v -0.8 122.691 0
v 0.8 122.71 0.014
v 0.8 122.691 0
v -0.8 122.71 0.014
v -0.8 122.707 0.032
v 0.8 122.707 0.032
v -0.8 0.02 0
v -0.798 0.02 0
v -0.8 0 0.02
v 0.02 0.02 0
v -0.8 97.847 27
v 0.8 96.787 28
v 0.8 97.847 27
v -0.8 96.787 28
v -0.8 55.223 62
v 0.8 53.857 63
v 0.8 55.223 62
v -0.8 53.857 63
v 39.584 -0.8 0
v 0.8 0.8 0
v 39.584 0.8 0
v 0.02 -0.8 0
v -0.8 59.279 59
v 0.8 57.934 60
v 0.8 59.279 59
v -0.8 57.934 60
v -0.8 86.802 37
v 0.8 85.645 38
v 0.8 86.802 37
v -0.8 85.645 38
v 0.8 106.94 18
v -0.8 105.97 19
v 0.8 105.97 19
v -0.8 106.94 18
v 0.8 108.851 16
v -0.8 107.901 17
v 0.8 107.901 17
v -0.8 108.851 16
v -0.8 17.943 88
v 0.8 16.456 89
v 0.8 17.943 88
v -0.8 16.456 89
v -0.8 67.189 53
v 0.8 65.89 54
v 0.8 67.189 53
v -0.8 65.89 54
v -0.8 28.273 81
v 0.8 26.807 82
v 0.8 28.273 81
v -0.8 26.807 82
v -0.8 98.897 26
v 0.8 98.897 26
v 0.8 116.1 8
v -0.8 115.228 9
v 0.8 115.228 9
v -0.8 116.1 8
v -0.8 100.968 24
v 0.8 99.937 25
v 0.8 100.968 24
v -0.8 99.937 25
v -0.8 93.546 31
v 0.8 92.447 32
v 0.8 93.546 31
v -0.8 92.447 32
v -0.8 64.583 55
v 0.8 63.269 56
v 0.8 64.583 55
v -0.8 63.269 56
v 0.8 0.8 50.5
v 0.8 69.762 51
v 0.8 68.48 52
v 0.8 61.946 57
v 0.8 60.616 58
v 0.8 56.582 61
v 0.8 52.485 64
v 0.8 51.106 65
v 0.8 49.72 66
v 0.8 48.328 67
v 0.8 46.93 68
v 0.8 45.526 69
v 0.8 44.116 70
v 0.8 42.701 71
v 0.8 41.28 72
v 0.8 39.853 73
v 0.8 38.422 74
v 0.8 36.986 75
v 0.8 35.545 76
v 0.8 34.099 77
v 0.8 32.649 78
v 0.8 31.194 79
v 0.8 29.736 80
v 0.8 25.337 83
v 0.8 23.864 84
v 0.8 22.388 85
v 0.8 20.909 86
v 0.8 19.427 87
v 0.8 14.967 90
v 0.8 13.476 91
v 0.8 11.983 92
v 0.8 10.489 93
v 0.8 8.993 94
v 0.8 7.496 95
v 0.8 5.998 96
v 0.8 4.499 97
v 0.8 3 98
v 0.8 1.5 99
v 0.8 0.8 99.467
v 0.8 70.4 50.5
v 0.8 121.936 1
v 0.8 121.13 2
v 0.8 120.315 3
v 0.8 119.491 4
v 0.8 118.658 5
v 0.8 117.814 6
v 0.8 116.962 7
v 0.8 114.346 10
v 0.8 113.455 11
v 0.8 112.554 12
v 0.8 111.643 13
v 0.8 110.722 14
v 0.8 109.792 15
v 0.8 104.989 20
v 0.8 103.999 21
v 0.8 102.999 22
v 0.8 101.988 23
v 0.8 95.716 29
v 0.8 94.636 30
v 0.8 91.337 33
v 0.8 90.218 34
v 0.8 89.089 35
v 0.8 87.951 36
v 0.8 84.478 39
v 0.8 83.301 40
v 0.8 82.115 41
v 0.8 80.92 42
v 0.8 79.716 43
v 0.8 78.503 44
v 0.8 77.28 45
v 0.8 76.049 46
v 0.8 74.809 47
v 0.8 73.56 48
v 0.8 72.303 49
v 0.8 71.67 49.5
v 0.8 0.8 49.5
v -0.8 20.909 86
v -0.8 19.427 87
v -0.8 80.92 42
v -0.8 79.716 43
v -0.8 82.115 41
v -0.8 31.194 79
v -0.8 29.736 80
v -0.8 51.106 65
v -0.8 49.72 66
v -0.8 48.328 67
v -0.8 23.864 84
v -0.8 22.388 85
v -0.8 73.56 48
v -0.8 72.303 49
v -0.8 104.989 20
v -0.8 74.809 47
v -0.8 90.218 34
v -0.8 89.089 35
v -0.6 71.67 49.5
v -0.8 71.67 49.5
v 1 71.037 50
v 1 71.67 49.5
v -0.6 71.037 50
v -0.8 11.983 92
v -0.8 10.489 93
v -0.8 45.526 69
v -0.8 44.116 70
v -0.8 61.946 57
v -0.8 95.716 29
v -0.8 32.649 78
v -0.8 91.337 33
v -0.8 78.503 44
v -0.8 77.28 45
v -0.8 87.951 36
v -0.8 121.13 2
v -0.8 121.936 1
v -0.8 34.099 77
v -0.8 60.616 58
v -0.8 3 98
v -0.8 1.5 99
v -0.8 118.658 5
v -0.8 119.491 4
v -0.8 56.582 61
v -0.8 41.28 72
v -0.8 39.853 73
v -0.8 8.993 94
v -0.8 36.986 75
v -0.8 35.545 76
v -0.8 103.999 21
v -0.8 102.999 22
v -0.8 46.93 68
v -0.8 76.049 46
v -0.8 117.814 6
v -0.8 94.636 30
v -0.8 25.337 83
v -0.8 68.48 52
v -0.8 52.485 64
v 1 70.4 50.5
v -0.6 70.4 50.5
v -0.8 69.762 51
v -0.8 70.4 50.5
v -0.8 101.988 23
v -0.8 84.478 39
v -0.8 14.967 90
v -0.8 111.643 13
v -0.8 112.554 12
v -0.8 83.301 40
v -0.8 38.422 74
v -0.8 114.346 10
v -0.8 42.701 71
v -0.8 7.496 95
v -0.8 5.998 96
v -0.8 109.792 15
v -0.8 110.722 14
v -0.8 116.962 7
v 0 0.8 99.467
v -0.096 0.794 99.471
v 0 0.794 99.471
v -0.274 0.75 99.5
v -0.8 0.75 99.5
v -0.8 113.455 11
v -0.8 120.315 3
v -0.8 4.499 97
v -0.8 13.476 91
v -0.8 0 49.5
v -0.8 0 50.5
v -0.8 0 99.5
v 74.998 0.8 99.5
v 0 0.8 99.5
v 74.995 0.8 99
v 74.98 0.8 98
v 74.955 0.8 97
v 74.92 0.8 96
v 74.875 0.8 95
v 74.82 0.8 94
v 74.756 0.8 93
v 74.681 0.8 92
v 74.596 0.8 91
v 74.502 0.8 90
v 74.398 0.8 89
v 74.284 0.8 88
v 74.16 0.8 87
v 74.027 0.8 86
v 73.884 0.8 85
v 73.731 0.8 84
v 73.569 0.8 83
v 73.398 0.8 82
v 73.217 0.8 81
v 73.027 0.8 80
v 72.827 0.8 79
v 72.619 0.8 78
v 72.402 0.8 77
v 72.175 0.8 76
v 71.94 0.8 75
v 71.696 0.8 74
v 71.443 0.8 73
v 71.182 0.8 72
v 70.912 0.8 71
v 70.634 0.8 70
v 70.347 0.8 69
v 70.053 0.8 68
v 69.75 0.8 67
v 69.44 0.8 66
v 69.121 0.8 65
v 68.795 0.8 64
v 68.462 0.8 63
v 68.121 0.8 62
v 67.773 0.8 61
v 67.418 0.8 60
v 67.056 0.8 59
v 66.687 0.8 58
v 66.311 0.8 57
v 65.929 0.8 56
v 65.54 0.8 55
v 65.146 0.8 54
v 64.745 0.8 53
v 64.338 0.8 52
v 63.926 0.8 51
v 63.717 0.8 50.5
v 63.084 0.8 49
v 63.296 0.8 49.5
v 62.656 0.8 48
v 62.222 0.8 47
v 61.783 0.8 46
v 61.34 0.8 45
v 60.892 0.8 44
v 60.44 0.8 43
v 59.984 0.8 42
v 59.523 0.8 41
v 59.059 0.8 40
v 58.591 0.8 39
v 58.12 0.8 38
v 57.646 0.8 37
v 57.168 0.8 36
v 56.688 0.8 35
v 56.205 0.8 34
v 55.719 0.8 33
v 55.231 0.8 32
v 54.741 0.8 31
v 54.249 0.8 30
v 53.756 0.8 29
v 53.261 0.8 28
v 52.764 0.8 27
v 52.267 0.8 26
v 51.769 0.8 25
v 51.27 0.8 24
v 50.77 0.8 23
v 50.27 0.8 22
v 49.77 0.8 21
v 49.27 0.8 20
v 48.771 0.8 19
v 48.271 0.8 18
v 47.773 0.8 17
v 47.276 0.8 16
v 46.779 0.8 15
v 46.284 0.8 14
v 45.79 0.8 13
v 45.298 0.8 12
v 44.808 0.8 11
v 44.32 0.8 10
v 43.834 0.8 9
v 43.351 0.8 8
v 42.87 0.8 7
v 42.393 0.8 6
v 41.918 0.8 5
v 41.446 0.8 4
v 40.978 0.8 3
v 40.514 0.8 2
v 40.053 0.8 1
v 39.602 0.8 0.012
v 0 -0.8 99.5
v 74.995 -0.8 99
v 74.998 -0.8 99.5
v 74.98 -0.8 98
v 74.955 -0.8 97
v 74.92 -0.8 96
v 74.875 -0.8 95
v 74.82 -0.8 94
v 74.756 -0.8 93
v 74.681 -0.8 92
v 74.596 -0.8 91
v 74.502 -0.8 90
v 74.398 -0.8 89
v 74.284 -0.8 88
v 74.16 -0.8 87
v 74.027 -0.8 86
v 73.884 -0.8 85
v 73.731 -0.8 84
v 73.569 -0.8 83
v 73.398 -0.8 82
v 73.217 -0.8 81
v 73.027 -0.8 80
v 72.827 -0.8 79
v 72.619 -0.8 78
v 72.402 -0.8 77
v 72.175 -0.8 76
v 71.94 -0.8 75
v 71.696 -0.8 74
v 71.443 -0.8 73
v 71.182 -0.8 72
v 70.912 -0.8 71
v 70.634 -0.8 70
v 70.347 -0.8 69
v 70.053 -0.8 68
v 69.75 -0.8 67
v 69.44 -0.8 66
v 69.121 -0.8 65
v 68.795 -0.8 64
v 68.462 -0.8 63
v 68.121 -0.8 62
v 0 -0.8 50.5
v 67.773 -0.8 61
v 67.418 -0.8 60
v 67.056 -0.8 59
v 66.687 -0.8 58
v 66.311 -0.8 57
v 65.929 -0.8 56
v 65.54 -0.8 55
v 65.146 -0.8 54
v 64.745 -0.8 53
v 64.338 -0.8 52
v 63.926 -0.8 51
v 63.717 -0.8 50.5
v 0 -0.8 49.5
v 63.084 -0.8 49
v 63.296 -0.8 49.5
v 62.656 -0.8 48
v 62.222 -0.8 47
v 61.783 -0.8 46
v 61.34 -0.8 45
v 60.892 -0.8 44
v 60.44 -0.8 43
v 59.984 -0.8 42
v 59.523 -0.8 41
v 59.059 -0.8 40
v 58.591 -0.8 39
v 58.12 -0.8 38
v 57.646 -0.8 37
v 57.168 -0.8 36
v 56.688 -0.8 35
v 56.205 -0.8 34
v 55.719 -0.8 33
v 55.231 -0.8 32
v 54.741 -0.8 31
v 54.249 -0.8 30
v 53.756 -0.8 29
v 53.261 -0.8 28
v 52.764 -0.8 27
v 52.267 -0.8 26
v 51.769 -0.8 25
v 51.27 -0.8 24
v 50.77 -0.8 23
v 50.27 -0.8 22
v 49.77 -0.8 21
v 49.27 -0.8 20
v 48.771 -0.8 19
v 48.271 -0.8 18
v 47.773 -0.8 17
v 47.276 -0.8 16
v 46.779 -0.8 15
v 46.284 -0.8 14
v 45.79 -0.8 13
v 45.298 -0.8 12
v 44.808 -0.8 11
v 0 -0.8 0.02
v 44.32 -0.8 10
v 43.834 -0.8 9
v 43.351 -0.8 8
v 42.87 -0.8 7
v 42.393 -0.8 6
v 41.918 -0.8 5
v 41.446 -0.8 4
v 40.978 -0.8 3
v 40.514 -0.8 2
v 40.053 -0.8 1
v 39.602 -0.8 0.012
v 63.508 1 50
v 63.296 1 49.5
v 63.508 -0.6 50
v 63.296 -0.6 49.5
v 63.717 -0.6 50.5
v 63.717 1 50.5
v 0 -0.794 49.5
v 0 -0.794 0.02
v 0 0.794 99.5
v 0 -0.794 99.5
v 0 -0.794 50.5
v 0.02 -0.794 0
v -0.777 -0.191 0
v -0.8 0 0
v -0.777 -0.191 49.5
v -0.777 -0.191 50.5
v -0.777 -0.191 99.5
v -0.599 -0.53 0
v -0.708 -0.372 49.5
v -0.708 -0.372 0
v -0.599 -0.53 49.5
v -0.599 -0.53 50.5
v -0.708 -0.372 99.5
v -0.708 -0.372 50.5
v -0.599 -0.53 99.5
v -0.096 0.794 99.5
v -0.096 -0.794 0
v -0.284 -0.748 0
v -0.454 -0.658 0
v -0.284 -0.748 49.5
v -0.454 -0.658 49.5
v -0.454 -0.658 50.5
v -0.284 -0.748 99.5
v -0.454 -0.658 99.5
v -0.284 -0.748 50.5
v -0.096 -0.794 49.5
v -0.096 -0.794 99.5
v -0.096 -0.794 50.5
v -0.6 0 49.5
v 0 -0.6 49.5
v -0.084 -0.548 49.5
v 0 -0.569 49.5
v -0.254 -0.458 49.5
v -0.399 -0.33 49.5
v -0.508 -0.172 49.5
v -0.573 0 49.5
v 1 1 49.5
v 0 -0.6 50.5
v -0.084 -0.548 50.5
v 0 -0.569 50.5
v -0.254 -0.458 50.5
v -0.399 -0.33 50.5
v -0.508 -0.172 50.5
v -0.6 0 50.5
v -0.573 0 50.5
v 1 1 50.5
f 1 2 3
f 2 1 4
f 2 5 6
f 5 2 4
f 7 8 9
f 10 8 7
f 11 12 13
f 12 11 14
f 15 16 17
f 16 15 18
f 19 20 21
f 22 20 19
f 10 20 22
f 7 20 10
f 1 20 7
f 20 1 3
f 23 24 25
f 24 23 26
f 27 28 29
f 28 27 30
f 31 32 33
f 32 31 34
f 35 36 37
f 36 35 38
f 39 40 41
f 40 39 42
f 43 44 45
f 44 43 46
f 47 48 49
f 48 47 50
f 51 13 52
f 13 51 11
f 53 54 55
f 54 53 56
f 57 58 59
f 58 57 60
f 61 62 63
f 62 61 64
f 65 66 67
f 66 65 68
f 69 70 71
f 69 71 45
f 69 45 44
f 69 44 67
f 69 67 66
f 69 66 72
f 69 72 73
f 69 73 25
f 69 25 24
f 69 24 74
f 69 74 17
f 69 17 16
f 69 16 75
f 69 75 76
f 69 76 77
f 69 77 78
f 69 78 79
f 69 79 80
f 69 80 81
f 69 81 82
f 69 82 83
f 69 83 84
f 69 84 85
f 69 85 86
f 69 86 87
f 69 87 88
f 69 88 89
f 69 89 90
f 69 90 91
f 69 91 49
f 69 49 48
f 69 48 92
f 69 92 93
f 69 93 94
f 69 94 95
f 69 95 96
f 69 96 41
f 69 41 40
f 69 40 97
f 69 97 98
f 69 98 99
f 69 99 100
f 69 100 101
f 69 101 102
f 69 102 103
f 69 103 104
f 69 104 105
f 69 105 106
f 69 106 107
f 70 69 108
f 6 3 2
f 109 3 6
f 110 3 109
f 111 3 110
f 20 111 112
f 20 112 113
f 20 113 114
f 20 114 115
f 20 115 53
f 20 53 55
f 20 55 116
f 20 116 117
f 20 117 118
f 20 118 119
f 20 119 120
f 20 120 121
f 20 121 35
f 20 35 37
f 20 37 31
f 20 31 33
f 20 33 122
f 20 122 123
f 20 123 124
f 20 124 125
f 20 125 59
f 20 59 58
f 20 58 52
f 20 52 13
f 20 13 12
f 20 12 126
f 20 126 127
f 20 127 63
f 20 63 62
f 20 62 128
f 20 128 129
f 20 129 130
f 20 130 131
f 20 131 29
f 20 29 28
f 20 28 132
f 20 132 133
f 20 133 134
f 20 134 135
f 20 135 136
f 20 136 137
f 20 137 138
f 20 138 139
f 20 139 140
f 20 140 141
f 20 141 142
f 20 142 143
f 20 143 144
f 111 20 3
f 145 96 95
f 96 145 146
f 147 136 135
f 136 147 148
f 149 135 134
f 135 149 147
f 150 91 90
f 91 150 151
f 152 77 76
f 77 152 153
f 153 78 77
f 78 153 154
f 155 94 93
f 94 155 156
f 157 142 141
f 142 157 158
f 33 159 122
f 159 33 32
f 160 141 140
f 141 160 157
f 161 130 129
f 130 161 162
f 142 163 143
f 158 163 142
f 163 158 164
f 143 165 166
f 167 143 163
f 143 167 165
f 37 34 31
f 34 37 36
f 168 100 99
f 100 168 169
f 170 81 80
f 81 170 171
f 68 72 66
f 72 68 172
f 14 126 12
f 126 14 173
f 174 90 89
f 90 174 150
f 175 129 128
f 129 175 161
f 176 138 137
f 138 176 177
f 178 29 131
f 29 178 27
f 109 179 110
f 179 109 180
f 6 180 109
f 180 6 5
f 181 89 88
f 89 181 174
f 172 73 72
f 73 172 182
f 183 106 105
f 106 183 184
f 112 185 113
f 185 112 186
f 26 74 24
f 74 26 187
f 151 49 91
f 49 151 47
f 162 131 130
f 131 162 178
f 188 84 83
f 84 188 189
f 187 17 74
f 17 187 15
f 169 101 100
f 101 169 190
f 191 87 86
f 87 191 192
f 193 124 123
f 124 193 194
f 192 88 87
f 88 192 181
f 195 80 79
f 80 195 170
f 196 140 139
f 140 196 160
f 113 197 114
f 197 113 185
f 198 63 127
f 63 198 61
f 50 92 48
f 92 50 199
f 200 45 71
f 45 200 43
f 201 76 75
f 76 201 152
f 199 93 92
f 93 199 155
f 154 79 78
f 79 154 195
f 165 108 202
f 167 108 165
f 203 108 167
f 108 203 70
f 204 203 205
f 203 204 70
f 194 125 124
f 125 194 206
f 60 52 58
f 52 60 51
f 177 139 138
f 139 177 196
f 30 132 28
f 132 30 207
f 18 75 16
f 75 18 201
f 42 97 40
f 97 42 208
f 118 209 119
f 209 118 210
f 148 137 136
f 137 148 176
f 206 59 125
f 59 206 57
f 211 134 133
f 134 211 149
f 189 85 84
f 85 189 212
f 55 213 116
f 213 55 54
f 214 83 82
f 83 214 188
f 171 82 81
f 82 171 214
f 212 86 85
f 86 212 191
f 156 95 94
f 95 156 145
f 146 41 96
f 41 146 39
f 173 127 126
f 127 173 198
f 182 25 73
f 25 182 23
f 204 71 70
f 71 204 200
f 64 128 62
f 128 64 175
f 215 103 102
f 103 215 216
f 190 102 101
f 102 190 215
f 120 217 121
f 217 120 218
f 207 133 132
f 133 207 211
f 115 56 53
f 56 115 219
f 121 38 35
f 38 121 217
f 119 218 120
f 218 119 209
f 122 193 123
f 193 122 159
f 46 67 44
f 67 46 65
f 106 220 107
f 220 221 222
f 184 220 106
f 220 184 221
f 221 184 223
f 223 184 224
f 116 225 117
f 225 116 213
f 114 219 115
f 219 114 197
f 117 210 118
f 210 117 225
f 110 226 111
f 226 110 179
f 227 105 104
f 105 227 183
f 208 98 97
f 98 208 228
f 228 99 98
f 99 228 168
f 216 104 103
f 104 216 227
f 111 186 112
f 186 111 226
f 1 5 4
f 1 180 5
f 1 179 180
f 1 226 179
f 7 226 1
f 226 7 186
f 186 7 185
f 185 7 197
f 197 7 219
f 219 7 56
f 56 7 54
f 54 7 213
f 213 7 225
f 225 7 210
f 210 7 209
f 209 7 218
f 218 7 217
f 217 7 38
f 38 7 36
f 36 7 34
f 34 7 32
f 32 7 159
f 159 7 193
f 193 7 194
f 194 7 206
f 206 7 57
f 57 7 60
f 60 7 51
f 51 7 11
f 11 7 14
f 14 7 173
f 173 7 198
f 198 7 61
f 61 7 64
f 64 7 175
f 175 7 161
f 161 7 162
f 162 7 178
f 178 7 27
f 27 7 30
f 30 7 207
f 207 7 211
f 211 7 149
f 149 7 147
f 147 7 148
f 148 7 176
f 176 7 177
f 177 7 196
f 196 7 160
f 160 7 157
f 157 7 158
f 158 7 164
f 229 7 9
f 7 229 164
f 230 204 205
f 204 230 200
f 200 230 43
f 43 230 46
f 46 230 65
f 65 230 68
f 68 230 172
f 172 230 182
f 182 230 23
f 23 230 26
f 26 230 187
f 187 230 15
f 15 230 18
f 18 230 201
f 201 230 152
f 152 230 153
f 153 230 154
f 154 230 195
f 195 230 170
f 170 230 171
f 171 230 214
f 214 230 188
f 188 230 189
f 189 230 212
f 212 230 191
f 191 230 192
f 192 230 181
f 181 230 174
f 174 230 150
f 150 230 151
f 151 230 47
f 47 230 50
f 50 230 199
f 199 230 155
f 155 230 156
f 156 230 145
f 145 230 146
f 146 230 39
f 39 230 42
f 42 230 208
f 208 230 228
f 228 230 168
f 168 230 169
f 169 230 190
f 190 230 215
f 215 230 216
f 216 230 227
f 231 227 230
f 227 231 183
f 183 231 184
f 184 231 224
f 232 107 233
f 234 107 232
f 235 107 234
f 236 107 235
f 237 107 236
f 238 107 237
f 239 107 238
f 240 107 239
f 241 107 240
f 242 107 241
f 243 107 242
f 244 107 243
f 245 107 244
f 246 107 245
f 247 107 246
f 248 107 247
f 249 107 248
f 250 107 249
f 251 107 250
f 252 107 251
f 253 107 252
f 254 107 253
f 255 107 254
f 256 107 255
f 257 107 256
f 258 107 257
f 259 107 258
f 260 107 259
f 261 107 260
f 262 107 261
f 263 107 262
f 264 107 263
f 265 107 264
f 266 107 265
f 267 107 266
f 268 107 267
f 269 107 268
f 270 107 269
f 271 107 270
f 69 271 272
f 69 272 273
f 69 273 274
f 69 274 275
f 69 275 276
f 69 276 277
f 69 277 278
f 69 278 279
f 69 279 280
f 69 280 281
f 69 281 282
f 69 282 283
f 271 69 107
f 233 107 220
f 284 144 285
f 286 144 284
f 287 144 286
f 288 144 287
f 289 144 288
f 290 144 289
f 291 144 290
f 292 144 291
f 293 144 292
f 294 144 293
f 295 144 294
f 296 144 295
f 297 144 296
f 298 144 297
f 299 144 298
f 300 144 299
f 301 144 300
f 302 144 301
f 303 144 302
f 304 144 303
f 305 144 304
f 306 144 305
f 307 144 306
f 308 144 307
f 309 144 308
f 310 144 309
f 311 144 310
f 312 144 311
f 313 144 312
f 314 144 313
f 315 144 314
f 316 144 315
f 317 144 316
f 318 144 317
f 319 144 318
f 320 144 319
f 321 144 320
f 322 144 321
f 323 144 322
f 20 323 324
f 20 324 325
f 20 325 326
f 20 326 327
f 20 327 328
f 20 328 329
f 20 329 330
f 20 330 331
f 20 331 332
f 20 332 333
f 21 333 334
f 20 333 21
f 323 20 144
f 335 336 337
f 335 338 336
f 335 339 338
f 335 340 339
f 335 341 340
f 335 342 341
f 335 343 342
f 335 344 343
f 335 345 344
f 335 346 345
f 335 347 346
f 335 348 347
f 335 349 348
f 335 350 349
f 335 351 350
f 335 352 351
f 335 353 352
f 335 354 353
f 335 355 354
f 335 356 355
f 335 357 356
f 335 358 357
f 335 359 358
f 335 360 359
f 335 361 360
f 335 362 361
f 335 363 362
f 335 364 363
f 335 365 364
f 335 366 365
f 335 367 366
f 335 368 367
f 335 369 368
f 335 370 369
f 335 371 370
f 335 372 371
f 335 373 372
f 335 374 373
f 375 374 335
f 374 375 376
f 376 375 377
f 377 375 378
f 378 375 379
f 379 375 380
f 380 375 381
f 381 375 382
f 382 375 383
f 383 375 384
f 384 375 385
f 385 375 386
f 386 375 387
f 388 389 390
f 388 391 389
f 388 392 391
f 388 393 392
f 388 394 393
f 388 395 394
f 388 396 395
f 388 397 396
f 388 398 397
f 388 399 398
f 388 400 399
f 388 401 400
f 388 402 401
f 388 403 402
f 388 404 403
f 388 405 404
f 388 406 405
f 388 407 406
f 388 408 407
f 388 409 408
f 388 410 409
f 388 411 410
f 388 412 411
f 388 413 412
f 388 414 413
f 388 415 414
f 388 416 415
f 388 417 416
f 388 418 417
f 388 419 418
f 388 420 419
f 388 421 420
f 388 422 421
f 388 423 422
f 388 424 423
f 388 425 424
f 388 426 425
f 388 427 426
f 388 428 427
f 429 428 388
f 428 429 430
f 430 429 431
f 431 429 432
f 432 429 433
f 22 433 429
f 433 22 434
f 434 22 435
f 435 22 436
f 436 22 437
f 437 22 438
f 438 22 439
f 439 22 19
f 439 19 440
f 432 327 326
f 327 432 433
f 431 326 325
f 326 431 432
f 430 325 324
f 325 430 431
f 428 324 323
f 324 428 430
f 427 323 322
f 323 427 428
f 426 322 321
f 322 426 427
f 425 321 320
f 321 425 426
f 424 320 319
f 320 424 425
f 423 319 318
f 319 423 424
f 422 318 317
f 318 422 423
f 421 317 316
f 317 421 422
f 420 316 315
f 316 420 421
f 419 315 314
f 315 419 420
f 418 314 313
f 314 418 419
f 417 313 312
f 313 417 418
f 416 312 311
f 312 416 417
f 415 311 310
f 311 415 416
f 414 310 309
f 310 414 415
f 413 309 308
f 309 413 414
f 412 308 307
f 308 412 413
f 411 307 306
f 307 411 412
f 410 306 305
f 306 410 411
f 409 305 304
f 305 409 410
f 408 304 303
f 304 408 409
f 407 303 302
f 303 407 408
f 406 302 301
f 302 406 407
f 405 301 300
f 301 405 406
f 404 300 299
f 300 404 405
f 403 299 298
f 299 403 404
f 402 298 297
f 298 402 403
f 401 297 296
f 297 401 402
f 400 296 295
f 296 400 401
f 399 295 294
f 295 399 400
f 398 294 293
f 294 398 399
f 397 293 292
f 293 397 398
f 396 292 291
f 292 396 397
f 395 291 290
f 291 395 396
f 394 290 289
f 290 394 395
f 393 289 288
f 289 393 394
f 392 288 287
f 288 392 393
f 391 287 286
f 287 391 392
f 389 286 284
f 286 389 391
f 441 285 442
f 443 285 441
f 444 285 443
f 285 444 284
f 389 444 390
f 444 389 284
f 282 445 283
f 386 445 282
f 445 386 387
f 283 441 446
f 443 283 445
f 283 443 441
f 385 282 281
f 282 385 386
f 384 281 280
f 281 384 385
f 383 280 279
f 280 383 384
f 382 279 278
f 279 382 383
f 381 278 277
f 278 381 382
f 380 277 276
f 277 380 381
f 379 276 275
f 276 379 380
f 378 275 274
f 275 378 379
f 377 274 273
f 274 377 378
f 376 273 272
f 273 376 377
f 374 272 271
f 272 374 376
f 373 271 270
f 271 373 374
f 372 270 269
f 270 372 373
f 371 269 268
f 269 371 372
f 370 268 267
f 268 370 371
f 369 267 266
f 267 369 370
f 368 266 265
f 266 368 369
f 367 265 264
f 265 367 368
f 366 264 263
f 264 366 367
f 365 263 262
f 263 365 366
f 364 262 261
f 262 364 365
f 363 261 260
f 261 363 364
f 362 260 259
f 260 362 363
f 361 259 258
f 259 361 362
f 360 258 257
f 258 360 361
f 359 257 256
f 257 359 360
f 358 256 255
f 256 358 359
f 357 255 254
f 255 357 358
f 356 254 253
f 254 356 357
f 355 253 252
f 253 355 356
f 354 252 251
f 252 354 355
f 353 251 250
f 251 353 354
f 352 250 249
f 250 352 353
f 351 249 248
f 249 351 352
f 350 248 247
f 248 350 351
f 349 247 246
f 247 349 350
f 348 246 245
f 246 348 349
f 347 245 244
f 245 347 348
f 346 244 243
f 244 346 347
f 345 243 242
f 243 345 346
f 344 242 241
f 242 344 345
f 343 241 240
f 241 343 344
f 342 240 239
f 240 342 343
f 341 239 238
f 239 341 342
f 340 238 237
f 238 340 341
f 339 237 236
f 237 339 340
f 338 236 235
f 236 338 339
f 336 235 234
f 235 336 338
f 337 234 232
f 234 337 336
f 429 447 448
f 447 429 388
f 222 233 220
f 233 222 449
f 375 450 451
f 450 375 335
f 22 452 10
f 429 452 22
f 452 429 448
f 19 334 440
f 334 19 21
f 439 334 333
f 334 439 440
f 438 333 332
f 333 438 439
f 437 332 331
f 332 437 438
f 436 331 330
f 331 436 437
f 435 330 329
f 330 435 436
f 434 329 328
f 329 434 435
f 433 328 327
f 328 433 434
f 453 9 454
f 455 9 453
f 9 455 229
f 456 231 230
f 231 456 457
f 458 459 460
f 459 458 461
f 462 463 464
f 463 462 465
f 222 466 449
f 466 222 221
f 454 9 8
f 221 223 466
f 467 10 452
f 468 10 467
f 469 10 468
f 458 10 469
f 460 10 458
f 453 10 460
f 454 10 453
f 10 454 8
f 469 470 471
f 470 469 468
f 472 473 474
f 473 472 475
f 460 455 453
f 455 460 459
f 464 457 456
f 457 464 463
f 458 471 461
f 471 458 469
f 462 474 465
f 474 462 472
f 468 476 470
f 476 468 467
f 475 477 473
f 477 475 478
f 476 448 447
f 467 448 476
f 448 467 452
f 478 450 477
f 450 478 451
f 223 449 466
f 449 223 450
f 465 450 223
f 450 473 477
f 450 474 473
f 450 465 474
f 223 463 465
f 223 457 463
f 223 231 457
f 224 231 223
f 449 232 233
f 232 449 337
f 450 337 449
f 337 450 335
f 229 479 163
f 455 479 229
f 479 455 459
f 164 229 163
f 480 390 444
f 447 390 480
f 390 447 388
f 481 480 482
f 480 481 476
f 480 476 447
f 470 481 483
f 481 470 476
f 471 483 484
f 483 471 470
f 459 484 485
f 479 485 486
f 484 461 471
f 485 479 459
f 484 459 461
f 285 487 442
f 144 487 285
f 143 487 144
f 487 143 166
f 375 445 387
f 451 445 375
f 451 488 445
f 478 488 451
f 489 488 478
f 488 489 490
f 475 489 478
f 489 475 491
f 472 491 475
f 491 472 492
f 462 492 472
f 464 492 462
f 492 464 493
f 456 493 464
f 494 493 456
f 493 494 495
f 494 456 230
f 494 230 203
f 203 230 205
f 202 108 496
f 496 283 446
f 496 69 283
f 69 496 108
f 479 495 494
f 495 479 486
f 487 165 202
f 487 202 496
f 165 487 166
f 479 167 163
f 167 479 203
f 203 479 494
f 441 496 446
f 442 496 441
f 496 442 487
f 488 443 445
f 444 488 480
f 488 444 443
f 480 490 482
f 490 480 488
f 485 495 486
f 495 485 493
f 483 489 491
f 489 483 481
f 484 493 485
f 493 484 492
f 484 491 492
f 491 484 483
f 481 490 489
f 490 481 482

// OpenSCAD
// File derivativeintegral.scad
// Plots two perpendicular curves
// d(x) is the derivative of f(x) and
// f(x) is the integral of d(x)
// the numerically calculated  integral and derivative are
// shown in red for comparison, but not printed
// (c) 2018-2022 Rich Cameron, for the book Make:Calculus
// Licensed under a Creative Commons, Attribution,
// CC-BY 4.0 international license, per
// https://creativecommons.org/licenses/by/4.0/
// Attribute to Rich Cameron, at
// repository github.com/whosawhatsis/Calculus

function custom_f(x) = sin(rad2deg(x)) / 2 + x;
function custom_d(x) = cos(rad2deg(x)) / 2 + 1;

xmin = 0;
xmax = 2;
xmark = .2;
xunit = 0; //scale of x axis in mm

steps = 100;
thick = 1.6;

flip = false;
vasewidth = 0;
base = 0;

c = true; // use +c to make the calculated integral match (does not affect STL)


func = "custom"; // ["custom", "x^2 / 2", "sin(x)", "e^(x / 2)", "e^x", "x^2 / 2 - 4.5", "x^3 / 12 - x", "x^2 / 4 - 1", "-cos(x) * sin(y) + 1.5, x = 0", "-cos(x) * sin(y) + 1.5, x = 4", "-cos(x) * sin(y) + 1.5, y = 5", "x^3 / 6 - x - .5", "9.6/16 * x^2 (lego)", "-e^(-2 * x) / 2 + .5", "sin(x) / 2 + x"]

/* [2D-only] */

outline = true;
foldline = true;
drawline = true;
boundingbox = true;

{} // end customizer

unit = xunit ? xunit : 100 / abs(xmax - xmin);
step = (xmax - xmin) / steps;

function f(x) = unit * (
	(func == "x^2 / 2") ? pow(x, 2) / 2:
	(func == "sin(x)") ? sin(rad2deg(x)):
	(func == "e^(x / 2)") ? .5 * exp(x / 2):
	(func == "e^x") ? .5 * exp(x):
	(func == "x^2 / 2 - 4.5") ? pow(x, 2) / 2 - 4.5:
	(func == "x^3 / 12 - x") ? pow(x, 3) / 12 - x:
	(func == "x^2 / 4 - 1") ? pow(x, 2) / 4 - 1:
	(func == "-cos(x) * sin(y) + 1.5, x = 0") ? -cos(rad2deg(0)) * sin(rad2deg(x)) + 1.5:
	(func == "-cos(x) * sin(y) + 1.5, x = 4") ? -cos(rad2deg(4)) * sin(rad2deg(x)) + 1.5:
	(func == "-cos(x) * sin(y) + 1.5, y = 5") ? -cos(rad2deg(x)) * sin(rad2deg(5)) + 1.5:
	(func == "x^3 / 6 - x - .5") ? pow(x, 3) / 6 - x - .5:
	(func == "9.6/16 * x^2 (lego)") ? 9.6/16 * pow(x, 2):
	(func == "-e^(-2 * x) / 2 + .5") ? -exp(-2 * x) / 2 + .5:
	(func == "sin(x) / 2 + x") ? sin(rad2deg(x)) / 2 + x:
	custom_f(x)); // default
/**/

function d(x) = unit * (
	(func == "x^2 / 2") ? x:
	(func == "sin(x)") ? cos(rad2deg(x)):
	(func == "e^(x / 2)") ? .5 * exp(x / 2) / 2:
	(func == "e^x") ? .5 * exp(x):
	(func == "x^2 / 2 - 4.5") ? x:
	(func == "x^3 / 12 - x") ? pow(x, 2) / 4 - 1:
	(func == "x^2 / 4 - 1") ? pow(x, 1) / 2:
	(func == "-cos(x) * sin(y) + 1.5, x = 0") ? -cos(rad2deg(0)) * cos(rad2deg(x)):
	(func == "-cos(x) * sin(y) + 1.5, x = 4") ? -cos(rad2deg(4)) * cos(rad2deg(x)):
	(func == "-cos(x) * sin(y) + 1.5, y = 5") ? sin(rad2deg(x)) * sin(rad2deg(5)):
	(func == "x^3 / 6 - x - .5") ? pow(x, 2) / 2 - 1:
	(func == "9.6/16 * x^2 (lego)") ? 9.6/16 * 2 * x:
	(func == "-e^(-2 * x) / 2 + .5") ? exp(-2 * x):
	(func == "sin(x) / 2 + x") ? cos(rad2deg(x)) / 2 + 1:
	custom_d(x)); // default


x = [for(x = [xmin:step:xmax + step / 2]) x];
integral = integrate([for(x = x) d(x) * step], (c ? f(xmin) : 0) - step * d(0));
f = [for(x = x) [unit * x, f(x)]];
d = [for(x = x) [unit * x, d(x)]];
_f = [for(i = [0 : len(integral) - 1]) [unit * x[i], integral[i]]];
_d = [for(x = x) [unit * x, (f(x + step / 2) - f(x - step / 2)) / step]];

$fs = .2;
$fa = 2;

if(thick) {
	rotate([flip ? 180 : 0, 0, 0]) {
		translate([0, 0, flip ? -unit * (xmax - xmin) : 0]) {
			3d();
			if(vasewidth) vase();
		}
		translate([0, 0, flip ? base : 0]) base(base);
	}
}
else {
	2d(outline, foldline, drawline, boundingbox);
	%3d(1);
}

module 2d(outline = true, foldline = true, drawline = true, boundingbox = false) difference() {
	if(boundingbox) translate([-1, -max([for(i = d) i[1]]) - 1, 0]) square([(xmax - xmin) * unit + 2, max([for(i = f) i[1]]) + max([for(i = d) i[1]]) + 2]);
	if(outline) difference() {
		union() {
			intersection() {
				union() for(m = [0, 1]) mirror([0, m, 0]) f_poly();
				translate([-1000, 0, 0]) square(2000);
			}
			intersection() {
				union() for(m = [0, 1]) mirror([0, m, 0]) d_poly();
				translate([-1000, -2000, 0]) square(2000);
			}
		}
		if(drawline) 2d(false, false, true, false);
		if(foldline) 2d(false, true, false, false);
	} else intersection() {
		2d(true, false, false, false);
		union() {
			if(drawline) {
				for(x = [ceil(xmin + step):xmax - step]) translate([x * unit, 0, 0]) square([.0001, 1000], center = true);
				intersection() {
					square([5000, .5], center = true);
					offset(-.001) {
						intersection() {
								f_poly();
								d_poly();
						}
						intersection() {
							mirror([0, 1, 0]) f_poly();
							mirror([0, 1, 0]) d_poly();
						}
					}
				}
			}
			if(foldline) square([5000, .0001], center = true);
		}
	}
}

module 3d(thick = thick) translate([0, 0, unit * xmax]) rotate([0, 90 ,0]) {
	difference() {
		union() {
			linear_extrude(thick, center = true) f_poly();
			rotate([90, 0, 0]) linear_extrude(thick, center = true) d_poly();
		rotate([0, 90, 0]) translate([0, 0, xmin * unit]) cylinder(r = thick / 2, h = (xmax - xmin) * unit);
		}
		if(ceil(xmin + step) < (xmax - step)) for(x = [ceil(xmin):xmax - step]) translate([x * unit, 0, 0]) cube([1, 1000, 1000], center = true);
	}
		
	#%translate([0, 0, xmark / 2]) linear_extrude(thick, center = true) f_poly(_f);
	#%rotate([90, 0, 0]) translate([0, 0, -xmark / 2]) linear_extrude(thick, center = true) d_poly(_d);
		
	if(ceil(xmin + step) < (xmax - step)) 
	intersection() {
		union() {
			translate([0, 0, xmark]) linear_extrude(thick, center = true) f_poly();
			rotate([90, 0, 0]) translate([0, 0, -xmark]) linear_extrude(thick, center = true) d_poly();
			rotate([0, 90, 0]) translate([-xmark, xmark, xmin * unit]) cylinder(r = thick / 2, h = (xmax - xmin) * unit);
		}
		union() for(x = [ceil(xmin + step):xmax - step]) translate([x * unit, 0, 0]) cube([1, 1000, 1000], center = true);
	}
}

module f_poly(f = f) offset((xmax - xmin) / 100) offset(-(xmax - xmin) / 101) polygon(concat(f, [[max(x) * unit, 0], [min(x) * unit, 0]]));
module d_poly(d = d) offset((xmax - xmin) / 100) offset(-(xmax - xmin) / 101) polygon(concat(d, [[max(x) * unit, 0], [min(x) * unit, 0]]));

module vase() translate([0, 0, unit * xmax]) rotate([0, 90, -90]) {
	for(i = [0, 1]) translate([0, 0, i * (vasewidth + thick)]) linear_extrude(thick, center = true) {
		for(i = [1, -1]) translate([0, thick * i, 0]) d_poly();
		translate([unit * xmin, -thick, 0]) square([unit * (xmax - xmin), thick * 2]);
	}
	linear_extrude(vasewidth + thick, convexity = 5) for(i = [-1, 1]) {
		difference() {
			union() {
				translate([0, thick * i, 0]) d_poly();
				translate([unit * xmin, -thick, 0]) square([unit * (xmax - xmin), thick * 2]);
			}
			d_poly();
		}
	}
	echo([for(x = [xmin:xmax]) f(x)]);
	echo([for(x = [xmin:xmax]) f(x) * unit * vasewidth / 1000]);
}


module base(height = 0) if(height) mirror([0, 0, 1]) linear_extrude(height) offset(thick / 3)  offset(-thick / 3) hull() {
	square(thick, center = true);
	translate([0, max([for(x = x) f(x)]), 0]) square([thick, .01], center = true);
	translate([0, min([for(x = x) f(x)]), 0]) square([thick, .01], center = true);
	translate([max([for(x = x) d(x)]), 0, 0]) square([.01, thick], center = true);
	translate([min([for(x = x) d(x)]), 0, 0]) square([.01, thick], center = true);
	if(vasewidth) {
		translate([0, -vasewidth / 2 - thick / 2, 0]) square([thick * 2, thick * 2 + vasewidth], center = true);
		translate([max([for(x = x) d(x)]), -vasewidth / 2 - thick / 2, 0]) square([thick * 2, thick * 2 + vasewidth], center = true);
		translate([min([for(x = x) d(x)]), -vasewidth / 2 - thick / 2, 0]) square([thick * 2, thick * 2 + vasewidth], center = true);
	}
}

function integrate(v, c = 0, sum = []) = (len(v) == len(sum)) ? sum : integrate(v, c, concat(sum, [len(sum) ? sum[len(sum) - 1] + v[len(sum)] : v[0] + c]));

function rad2deg(radians) = radians * 180 / PI;
